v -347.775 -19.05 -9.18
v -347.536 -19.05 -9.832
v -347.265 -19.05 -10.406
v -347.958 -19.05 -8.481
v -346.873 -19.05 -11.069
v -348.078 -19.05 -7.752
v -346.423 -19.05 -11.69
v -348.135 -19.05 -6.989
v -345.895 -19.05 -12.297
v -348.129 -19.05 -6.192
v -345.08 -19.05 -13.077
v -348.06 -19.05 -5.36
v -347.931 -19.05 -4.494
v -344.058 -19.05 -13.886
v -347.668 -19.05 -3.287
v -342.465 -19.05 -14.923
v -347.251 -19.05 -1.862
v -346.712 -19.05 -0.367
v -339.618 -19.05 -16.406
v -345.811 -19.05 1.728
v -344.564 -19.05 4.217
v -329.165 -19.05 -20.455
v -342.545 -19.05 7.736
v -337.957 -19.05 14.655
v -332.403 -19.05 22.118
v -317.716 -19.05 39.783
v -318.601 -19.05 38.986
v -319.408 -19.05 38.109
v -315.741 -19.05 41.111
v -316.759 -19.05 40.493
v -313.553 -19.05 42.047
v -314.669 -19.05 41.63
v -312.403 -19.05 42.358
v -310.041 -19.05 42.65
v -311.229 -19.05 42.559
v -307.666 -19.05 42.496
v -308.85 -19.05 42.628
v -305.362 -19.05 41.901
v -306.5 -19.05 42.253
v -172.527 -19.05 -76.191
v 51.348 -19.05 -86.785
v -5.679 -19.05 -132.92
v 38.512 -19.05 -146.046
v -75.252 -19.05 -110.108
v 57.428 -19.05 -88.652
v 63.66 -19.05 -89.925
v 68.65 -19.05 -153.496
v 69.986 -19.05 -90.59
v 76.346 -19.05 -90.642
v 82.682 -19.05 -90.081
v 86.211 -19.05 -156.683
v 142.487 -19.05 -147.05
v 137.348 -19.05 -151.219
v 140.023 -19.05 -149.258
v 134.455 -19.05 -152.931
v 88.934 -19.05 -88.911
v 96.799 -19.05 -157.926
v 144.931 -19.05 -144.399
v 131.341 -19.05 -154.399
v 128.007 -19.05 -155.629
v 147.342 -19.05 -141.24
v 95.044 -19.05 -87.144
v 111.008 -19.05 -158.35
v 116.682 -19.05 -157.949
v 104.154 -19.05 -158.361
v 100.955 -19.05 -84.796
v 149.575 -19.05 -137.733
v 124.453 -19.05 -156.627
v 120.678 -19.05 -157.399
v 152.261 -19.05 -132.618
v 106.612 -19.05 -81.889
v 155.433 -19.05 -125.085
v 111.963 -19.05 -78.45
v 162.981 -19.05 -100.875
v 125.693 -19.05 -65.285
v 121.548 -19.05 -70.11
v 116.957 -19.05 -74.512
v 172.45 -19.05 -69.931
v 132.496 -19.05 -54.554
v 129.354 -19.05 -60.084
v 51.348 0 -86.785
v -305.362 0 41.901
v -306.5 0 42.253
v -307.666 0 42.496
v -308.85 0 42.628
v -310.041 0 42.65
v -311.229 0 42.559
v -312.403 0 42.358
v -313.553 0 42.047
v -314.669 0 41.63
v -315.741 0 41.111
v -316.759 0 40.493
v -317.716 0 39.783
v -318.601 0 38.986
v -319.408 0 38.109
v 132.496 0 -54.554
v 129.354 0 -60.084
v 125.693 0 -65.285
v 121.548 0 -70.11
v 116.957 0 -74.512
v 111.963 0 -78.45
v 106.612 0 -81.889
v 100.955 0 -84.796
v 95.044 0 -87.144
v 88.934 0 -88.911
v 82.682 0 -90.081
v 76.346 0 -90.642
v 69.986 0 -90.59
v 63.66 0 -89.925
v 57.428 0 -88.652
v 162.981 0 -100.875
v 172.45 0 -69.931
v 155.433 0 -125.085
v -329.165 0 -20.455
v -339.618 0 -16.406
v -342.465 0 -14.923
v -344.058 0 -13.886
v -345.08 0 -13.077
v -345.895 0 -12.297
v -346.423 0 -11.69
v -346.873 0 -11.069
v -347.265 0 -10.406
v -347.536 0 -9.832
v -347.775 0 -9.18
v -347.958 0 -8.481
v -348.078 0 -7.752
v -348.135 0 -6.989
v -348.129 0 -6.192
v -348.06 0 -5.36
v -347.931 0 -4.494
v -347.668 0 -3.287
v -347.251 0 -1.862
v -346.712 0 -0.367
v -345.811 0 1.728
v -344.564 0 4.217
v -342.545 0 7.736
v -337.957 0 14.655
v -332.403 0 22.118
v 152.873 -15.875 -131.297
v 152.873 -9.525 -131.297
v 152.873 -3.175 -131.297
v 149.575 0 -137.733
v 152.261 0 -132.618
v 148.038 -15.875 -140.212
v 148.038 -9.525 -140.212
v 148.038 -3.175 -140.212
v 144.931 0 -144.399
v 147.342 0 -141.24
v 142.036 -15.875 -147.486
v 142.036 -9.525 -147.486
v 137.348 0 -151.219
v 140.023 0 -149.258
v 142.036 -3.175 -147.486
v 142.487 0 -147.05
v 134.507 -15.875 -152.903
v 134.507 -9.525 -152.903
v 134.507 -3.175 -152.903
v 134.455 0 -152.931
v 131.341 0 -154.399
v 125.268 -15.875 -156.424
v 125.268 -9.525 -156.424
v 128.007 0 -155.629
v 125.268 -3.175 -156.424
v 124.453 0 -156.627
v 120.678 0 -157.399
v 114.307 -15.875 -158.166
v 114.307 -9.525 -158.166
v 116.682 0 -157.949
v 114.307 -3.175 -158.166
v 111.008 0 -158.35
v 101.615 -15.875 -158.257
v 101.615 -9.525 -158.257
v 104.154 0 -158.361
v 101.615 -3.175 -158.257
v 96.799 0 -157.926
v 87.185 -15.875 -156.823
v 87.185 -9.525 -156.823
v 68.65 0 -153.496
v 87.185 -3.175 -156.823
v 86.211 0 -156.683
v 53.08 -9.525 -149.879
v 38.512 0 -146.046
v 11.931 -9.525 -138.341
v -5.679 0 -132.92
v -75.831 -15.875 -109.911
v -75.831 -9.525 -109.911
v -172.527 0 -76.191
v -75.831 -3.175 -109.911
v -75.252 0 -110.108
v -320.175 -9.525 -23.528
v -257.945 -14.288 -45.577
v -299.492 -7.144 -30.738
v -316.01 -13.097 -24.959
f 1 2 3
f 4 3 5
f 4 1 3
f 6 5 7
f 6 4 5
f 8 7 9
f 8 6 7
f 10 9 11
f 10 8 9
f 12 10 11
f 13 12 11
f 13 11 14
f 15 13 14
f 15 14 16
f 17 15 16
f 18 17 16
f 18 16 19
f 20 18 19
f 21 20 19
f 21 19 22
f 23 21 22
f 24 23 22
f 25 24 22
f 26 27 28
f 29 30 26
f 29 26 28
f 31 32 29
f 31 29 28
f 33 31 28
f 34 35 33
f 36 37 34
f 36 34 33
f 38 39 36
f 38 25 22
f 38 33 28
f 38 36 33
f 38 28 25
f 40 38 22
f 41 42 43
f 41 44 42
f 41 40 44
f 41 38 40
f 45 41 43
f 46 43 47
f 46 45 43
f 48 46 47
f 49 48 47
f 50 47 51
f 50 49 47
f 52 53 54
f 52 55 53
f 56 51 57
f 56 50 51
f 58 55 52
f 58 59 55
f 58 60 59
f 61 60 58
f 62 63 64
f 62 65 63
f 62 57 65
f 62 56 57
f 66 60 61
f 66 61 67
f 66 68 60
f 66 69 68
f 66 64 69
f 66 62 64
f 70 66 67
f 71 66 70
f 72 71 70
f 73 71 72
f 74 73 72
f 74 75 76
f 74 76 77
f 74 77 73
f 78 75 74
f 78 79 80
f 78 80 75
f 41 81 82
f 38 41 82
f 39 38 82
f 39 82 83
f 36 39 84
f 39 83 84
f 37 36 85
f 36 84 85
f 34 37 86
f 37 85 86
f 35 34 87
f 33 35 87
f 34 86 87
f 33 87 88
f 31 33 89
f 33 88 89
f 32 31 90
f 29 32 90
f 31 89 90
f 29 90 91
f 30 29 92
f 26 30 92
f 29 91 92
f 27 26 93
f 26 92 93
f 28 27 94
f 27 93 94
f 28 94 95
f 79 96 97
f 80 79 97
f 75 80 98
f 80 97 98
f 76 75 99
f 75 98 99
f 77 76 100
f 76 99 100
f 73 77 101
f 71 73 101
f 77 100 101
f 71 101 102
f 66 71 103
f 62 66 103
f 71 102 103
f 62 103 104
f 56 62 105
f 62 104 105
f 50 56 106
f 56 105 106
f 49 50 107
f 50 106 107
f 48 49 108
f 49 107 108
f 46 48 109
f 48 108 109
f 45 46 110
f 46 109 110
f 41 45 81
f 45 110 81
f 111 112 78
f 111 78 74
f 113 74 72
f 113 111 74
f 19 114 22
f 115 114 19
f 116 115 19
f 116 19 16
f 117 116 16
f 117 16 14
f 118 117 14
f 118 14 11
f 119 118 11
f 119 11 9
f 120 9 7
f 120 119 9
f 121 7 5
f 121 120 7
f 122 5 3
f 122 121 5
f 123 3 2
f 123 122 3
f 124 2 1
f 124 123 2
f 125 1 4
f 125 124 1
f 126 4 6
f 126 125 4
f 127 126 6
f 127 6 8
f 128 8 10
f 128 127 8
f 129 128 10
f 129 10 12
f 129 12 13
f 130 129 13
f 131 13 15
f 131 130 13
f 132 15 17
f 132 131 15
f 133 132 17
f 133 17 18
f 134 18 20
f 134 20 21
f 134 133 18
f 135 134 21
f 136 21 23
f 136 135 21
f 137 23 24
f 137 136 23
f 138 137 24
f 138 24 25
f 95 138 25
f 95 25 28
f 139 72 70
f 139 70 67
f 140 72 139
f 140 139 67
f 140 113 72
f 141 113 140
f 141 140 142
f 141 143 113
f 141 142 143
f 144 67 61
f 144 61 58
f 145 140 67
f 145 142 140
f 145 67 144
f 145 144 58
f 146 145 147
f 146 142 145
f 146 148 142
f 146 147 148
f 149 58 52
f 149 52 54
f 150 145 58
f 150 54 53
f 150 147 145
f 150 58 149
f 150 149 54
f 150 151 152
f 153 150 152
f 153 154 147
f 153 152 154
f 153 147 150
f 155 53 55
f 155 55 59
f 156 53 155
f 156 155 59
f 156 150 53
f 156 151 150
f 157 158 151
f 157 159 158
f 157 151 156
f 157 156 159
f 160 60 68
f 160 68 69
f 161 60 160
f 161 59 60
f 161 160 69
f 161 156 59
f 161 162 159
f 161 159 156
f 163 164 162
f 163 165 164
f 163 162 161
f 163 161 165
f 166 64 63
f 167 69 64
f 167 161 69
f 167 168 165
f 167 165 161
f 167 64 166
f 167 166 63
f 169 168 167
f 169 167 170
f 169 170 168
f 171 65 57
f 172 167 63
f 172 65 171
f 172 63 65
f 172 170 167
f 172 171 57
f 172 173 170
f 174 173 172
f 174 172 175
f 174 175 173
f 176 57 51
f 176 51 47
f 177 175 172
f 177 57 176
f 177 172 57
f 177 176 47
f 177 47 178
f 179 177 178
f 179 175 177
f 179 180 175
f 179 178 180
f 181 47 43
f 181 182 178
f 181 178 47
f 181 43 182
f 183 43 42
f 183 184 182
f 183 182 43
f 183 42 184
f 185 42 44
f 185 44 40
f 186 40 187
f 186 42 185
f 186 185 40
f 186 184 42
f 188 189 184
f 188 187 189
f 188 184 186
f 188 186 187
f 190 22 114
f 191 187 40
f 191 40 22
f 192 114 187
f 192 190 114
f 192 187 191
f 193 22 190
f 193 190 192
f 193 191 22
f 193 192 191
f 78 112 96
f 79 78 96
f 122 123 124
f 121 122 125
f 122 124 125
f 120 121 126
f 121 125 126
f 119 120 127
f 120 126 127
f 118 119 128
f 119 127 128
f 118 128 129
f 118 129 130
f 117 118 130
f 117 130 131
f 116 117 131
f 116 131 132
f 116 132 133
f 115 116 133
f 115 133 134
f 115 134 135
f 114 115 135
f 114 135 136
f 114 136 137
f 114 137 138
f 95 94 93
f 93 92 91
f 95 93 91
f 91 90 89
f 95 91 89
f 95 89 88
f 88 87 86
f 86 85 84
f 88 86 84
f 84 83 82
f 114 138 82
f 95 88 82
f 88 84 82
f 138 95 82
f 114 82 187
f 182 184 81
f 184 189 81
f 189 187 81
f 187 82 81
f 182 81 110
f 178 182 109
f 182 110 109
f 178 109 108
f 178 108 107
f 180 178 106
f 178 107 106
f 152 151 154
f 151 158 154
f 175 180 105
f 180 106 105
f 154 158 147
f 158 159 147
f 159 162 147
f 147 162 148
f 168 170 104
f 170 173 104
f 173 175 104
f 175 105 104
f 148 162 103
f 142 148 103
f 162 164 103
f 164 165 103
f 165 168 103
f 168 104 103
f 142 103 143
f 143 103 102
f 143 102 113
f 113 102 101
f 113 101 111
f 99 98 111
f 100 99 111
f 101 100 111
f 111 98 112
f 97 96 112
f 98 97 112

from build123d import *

# Parameters (mm, degrees)
F1_DEPTH = 19.05


with BuildPart() as f1:
    # F0 (on Front) → F1 (new body)
    with BuildSketch(Plane.XZ):
        with BuildLine():
            Line((51.3480285322, -86.7852984616), (-305.3616061666, 41.9014199259))
            ThreePointArc((-305.3616061666, 41.9014199259), (-312.981533952, 42.2160798285), (-319.4077985163, 38.1093251416))
            add(Edge.make_bspline(
                [(172.4495707126, -69.9309047478), (170.7565397374, -74.8879578834), (159.6172151028, -109.2209226086), (149.008066375, -172.0943551046), (5.705430346, -143.7182399989), (-308.8758408469, -25.714201087), (-359.3207511694, -11.2848664797), (-334.5650047362, 20.0112367074), (-319.4077985163, 38.1093251416)],
                knots=[0.7762192949, 0.7762192949, 0.7762192949, 0.7762192949, 0.7821011157, 0.8175501575, 0.8647494322, 0.9431559258, 0.9670432321, 0.9963460987, 0.9963460987, 0.9963460987, 0.9963460987], degree=3))
            Line((172.4495707126, -69.9309047478), (132.4956117337, -54.5537738749))
            ThreePointArc((132.4956117337, -54.5537738749), (98.0275737575, -86.0416650579), (51.3480285322, -86.7852984616))
        make_face()
    extrude(amount=F1_DEPTH)


solid = f1.part
